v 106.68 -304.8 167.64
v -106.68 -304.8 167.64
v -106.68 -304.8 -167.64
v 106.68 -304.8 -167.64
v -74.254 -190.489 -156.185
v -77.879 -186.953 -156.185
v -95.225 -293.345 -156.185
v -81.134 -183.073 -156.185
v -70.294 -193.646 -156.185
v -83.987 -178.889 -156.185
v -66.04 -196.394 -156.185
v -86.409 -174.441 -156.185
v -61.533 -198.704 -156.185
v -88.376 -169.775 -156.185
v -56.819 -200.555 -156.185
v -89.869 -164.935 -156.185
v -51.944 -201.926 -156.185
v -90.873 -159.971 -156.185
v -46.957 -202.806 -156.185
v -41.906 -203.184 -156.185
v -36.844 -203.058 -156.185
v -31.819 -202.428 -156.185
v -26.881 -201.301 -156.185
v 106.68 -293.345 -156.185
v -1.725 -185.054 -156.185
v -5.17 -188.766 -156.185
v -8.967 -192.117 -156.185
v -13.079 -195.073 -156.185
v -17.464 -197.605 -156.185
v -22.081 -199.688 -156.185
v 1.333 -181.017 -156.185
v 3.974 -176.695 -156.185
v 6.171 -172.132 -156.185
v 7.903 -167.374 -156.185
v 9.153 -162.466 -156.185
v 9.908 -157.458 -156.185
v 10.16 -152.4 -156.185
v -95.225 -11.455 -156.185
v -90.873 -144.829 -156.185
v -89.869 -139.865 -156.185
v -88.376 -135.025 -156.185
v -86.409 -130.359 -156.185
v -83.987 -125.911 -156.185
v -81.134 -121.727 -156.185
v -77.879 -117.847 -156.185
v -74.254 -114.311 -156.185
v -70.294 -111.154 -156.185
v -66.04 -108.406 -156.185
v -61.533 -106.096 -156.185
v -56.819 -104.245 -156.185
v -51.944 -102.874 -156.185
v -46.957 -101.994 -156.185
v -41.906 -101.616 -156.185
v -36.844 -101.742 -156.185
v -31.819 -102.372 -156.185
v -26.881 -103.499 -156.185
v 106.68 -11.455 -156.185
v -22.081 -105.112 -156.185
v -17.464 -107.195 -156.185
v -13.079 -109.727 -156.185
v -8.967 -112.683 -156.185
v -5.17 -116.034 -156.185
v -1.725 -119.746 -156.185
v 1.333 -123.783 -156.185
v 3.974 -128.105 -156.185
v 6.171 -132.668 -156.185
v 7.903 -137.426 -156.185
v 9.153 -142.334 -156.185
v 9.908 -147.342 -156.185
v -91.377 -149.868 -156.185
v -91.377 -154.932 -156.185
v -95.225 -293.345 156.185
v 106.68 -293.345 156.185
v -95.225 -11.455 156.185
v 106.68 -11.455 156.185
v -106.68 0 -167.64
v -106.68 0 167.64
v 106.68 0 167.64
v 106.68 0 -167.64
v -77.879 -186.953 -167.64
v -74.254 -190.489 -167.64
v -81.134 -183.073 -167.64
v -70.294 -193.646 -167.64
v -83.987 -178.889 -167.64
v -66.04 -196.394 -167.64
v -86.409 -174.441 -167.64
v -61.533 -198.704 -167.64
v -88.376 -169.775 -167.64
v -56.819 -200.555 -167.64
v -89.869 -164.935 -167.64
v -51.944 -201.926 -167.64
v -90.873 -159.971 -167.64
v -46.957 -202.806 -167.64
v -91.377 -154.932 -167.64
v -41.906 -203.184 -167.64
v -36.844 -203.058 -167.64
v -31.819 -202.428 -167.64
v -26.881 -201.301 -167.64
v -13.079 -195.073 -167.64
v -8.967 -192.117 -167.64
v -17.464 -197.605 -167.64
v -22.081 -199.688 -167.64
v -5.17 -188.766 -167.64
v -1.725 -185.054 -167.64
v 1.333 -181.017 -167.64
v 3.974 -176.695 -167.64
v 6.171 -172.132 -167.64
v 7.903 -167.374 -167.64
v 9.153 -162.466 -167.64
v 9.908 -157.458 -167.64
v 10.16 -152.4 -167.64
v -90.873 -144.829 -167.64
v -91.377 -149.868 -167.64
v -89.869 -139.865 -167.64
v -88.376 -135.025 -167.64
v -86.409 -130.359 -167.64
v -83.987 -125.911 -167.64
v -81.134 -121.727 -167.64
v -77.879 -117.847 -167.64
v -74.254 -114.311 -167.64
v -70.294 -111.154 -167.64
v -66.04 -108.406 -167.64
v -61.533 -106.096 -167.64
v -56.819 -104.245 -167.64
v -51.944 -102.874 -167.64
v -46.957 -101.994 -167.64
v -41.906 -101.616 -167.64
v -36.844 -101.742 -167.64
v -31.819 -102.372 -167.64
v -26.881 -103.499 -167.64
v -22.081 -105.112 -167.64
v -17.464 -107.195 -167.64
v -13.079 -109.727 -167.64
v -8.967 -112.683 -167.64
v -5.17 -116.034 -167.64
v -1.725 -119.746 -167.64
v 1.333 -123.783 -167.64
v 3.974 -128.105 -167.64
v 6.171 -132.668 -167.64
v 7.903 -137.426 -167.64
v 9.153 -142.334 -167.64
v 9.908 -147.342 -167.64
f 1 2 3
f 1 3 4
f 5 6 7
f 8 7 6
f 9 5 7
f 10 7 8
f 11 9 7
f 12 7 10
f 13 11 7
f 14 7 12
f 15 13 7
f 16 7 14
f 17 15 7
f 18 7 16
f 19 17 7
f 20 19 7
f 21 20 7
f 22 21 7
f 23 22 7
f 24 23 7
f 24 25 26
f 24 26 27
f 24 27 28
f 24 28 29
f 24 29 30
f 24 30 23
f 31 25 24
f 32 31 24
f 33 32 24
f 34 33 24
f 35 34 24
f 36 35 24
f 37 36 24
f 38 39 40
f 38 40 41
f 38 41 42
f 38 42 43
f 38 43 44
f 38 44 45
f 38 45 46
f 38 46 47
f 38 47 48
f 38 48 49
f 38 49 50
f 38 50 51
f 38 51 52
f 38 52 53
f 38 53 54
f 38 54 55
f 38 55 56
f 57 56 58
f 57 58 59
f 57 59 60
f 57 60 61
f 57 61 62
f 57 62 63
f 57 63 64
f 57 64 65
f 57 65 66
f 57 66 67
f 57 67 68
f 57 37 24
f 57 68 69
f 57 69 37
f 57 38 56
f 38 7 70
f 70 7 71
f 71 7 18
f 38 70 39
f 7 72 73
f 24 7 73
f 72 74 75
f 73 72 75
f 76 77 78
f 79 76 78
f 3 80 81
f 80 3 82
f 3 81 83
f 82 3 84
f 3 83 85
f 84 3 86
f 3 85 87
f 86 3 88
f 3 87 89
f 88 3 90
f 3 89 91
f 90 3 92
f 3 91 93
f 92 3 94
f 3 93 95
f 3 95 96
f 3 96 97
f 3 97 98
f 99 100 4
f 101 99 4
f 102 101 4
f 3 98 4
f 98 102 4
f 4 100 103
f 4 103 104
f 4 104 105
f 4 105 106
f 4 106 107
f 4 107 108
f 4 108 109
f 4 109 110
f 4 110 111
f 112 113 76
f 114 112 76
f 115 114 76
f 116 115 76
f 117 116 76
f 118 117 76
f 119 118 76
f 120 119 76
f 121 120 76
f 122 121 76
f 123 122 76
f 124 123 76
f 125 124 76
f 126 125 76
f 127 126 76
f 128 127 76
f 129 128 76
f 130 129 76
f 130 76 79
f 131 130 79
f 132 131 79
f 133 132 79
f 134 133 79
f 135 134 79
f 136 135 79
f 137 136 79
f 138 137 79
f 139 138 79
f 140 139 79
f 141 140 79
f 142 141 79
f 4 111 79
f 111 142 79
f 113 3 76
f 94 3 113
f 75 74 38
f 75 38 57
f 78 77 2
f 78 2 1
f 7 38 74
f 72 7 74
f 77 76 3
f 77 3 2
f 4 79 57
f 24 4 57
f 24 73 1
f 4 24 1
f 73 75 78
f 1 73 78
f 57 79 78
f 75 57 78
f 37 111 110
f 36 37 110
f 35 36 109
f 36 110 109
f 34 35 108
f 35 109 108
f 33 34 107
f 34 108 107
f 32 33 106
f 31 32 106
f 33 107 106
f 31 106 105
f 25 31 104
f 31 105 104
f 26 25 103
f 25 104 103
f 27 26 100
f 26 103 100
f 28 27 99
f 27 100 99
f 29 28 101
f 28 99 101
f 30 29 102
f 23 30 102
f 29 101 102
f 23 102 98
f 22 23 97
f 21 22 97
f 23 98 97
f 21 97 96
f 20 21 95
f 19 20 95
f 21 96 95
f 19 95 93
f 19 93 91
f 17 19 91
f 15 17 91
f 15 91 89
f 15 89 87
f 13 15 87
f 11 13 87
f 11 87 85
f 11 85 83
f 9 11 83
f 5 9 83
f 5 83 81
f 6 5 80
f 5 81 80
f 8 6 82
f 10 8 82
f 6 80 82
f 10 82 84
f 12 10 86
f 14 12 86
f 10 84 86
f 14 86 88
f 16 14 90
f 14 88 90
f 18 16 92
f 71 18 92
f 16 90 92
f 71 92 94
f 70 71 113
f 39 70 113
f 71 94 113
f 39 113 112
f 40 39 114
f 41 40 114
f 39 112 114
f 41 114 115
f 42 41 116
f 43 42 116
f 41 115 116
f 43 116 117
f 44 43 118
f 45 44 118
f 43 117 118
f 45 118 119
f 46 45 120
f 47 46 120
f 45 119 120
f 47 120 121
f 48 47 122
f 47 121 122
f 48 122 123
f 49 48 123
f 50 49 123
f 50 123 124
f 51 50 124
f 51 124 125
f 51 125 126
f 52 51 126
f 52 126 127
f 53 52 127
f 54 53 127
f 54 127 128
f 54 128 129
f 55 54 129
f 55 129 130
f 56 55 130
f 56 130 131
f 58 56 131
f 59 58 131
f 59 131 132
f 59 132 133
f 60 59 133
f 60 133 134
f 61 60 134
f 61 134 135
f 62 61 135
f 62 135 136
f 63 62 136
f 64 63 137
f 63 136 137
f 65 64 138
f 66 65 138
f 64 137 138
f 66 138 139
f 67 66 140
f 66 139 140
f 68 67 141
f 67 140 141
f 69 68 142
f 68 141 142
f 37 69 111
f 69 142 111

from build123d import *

# Parameters (mm, degrees)
F0_W     = 213.36
F0_H     = 335.28
F1_DEPTH = 304.8
F2_T     = -11.4554
F3_R     = 50.8
F4_DEPTH = 11.4554


with BuildPart() as f1:
    # F0 (on Front) → F1 (new body)
    with BuildSketch(Plane.XZ):
        Rectangle(F0_W, F0_H)
    extrude(amount=F1_DEPTH)

    # F2
    f2_openings = [f1.faces().sort_by_distance(p)[0] for p in [
        (106.68, -152.4, 0),
    ]]
    offset(amount=F2_T, openings=f2_openings)

    # F3 (on face) → F4 (cut, through all)
    with BuildSketch(Plane(origin=(0, 0, -167.64), x_dir=(1, 0, 0), z_dir=(0, 0, -1))):
        with Locations((-40.64, 152.4)):
            Circle(F3_R)
    extrude(amount=-F4_DEPTH, mode=Mode.SUBTRACT)


solid = f1.part
